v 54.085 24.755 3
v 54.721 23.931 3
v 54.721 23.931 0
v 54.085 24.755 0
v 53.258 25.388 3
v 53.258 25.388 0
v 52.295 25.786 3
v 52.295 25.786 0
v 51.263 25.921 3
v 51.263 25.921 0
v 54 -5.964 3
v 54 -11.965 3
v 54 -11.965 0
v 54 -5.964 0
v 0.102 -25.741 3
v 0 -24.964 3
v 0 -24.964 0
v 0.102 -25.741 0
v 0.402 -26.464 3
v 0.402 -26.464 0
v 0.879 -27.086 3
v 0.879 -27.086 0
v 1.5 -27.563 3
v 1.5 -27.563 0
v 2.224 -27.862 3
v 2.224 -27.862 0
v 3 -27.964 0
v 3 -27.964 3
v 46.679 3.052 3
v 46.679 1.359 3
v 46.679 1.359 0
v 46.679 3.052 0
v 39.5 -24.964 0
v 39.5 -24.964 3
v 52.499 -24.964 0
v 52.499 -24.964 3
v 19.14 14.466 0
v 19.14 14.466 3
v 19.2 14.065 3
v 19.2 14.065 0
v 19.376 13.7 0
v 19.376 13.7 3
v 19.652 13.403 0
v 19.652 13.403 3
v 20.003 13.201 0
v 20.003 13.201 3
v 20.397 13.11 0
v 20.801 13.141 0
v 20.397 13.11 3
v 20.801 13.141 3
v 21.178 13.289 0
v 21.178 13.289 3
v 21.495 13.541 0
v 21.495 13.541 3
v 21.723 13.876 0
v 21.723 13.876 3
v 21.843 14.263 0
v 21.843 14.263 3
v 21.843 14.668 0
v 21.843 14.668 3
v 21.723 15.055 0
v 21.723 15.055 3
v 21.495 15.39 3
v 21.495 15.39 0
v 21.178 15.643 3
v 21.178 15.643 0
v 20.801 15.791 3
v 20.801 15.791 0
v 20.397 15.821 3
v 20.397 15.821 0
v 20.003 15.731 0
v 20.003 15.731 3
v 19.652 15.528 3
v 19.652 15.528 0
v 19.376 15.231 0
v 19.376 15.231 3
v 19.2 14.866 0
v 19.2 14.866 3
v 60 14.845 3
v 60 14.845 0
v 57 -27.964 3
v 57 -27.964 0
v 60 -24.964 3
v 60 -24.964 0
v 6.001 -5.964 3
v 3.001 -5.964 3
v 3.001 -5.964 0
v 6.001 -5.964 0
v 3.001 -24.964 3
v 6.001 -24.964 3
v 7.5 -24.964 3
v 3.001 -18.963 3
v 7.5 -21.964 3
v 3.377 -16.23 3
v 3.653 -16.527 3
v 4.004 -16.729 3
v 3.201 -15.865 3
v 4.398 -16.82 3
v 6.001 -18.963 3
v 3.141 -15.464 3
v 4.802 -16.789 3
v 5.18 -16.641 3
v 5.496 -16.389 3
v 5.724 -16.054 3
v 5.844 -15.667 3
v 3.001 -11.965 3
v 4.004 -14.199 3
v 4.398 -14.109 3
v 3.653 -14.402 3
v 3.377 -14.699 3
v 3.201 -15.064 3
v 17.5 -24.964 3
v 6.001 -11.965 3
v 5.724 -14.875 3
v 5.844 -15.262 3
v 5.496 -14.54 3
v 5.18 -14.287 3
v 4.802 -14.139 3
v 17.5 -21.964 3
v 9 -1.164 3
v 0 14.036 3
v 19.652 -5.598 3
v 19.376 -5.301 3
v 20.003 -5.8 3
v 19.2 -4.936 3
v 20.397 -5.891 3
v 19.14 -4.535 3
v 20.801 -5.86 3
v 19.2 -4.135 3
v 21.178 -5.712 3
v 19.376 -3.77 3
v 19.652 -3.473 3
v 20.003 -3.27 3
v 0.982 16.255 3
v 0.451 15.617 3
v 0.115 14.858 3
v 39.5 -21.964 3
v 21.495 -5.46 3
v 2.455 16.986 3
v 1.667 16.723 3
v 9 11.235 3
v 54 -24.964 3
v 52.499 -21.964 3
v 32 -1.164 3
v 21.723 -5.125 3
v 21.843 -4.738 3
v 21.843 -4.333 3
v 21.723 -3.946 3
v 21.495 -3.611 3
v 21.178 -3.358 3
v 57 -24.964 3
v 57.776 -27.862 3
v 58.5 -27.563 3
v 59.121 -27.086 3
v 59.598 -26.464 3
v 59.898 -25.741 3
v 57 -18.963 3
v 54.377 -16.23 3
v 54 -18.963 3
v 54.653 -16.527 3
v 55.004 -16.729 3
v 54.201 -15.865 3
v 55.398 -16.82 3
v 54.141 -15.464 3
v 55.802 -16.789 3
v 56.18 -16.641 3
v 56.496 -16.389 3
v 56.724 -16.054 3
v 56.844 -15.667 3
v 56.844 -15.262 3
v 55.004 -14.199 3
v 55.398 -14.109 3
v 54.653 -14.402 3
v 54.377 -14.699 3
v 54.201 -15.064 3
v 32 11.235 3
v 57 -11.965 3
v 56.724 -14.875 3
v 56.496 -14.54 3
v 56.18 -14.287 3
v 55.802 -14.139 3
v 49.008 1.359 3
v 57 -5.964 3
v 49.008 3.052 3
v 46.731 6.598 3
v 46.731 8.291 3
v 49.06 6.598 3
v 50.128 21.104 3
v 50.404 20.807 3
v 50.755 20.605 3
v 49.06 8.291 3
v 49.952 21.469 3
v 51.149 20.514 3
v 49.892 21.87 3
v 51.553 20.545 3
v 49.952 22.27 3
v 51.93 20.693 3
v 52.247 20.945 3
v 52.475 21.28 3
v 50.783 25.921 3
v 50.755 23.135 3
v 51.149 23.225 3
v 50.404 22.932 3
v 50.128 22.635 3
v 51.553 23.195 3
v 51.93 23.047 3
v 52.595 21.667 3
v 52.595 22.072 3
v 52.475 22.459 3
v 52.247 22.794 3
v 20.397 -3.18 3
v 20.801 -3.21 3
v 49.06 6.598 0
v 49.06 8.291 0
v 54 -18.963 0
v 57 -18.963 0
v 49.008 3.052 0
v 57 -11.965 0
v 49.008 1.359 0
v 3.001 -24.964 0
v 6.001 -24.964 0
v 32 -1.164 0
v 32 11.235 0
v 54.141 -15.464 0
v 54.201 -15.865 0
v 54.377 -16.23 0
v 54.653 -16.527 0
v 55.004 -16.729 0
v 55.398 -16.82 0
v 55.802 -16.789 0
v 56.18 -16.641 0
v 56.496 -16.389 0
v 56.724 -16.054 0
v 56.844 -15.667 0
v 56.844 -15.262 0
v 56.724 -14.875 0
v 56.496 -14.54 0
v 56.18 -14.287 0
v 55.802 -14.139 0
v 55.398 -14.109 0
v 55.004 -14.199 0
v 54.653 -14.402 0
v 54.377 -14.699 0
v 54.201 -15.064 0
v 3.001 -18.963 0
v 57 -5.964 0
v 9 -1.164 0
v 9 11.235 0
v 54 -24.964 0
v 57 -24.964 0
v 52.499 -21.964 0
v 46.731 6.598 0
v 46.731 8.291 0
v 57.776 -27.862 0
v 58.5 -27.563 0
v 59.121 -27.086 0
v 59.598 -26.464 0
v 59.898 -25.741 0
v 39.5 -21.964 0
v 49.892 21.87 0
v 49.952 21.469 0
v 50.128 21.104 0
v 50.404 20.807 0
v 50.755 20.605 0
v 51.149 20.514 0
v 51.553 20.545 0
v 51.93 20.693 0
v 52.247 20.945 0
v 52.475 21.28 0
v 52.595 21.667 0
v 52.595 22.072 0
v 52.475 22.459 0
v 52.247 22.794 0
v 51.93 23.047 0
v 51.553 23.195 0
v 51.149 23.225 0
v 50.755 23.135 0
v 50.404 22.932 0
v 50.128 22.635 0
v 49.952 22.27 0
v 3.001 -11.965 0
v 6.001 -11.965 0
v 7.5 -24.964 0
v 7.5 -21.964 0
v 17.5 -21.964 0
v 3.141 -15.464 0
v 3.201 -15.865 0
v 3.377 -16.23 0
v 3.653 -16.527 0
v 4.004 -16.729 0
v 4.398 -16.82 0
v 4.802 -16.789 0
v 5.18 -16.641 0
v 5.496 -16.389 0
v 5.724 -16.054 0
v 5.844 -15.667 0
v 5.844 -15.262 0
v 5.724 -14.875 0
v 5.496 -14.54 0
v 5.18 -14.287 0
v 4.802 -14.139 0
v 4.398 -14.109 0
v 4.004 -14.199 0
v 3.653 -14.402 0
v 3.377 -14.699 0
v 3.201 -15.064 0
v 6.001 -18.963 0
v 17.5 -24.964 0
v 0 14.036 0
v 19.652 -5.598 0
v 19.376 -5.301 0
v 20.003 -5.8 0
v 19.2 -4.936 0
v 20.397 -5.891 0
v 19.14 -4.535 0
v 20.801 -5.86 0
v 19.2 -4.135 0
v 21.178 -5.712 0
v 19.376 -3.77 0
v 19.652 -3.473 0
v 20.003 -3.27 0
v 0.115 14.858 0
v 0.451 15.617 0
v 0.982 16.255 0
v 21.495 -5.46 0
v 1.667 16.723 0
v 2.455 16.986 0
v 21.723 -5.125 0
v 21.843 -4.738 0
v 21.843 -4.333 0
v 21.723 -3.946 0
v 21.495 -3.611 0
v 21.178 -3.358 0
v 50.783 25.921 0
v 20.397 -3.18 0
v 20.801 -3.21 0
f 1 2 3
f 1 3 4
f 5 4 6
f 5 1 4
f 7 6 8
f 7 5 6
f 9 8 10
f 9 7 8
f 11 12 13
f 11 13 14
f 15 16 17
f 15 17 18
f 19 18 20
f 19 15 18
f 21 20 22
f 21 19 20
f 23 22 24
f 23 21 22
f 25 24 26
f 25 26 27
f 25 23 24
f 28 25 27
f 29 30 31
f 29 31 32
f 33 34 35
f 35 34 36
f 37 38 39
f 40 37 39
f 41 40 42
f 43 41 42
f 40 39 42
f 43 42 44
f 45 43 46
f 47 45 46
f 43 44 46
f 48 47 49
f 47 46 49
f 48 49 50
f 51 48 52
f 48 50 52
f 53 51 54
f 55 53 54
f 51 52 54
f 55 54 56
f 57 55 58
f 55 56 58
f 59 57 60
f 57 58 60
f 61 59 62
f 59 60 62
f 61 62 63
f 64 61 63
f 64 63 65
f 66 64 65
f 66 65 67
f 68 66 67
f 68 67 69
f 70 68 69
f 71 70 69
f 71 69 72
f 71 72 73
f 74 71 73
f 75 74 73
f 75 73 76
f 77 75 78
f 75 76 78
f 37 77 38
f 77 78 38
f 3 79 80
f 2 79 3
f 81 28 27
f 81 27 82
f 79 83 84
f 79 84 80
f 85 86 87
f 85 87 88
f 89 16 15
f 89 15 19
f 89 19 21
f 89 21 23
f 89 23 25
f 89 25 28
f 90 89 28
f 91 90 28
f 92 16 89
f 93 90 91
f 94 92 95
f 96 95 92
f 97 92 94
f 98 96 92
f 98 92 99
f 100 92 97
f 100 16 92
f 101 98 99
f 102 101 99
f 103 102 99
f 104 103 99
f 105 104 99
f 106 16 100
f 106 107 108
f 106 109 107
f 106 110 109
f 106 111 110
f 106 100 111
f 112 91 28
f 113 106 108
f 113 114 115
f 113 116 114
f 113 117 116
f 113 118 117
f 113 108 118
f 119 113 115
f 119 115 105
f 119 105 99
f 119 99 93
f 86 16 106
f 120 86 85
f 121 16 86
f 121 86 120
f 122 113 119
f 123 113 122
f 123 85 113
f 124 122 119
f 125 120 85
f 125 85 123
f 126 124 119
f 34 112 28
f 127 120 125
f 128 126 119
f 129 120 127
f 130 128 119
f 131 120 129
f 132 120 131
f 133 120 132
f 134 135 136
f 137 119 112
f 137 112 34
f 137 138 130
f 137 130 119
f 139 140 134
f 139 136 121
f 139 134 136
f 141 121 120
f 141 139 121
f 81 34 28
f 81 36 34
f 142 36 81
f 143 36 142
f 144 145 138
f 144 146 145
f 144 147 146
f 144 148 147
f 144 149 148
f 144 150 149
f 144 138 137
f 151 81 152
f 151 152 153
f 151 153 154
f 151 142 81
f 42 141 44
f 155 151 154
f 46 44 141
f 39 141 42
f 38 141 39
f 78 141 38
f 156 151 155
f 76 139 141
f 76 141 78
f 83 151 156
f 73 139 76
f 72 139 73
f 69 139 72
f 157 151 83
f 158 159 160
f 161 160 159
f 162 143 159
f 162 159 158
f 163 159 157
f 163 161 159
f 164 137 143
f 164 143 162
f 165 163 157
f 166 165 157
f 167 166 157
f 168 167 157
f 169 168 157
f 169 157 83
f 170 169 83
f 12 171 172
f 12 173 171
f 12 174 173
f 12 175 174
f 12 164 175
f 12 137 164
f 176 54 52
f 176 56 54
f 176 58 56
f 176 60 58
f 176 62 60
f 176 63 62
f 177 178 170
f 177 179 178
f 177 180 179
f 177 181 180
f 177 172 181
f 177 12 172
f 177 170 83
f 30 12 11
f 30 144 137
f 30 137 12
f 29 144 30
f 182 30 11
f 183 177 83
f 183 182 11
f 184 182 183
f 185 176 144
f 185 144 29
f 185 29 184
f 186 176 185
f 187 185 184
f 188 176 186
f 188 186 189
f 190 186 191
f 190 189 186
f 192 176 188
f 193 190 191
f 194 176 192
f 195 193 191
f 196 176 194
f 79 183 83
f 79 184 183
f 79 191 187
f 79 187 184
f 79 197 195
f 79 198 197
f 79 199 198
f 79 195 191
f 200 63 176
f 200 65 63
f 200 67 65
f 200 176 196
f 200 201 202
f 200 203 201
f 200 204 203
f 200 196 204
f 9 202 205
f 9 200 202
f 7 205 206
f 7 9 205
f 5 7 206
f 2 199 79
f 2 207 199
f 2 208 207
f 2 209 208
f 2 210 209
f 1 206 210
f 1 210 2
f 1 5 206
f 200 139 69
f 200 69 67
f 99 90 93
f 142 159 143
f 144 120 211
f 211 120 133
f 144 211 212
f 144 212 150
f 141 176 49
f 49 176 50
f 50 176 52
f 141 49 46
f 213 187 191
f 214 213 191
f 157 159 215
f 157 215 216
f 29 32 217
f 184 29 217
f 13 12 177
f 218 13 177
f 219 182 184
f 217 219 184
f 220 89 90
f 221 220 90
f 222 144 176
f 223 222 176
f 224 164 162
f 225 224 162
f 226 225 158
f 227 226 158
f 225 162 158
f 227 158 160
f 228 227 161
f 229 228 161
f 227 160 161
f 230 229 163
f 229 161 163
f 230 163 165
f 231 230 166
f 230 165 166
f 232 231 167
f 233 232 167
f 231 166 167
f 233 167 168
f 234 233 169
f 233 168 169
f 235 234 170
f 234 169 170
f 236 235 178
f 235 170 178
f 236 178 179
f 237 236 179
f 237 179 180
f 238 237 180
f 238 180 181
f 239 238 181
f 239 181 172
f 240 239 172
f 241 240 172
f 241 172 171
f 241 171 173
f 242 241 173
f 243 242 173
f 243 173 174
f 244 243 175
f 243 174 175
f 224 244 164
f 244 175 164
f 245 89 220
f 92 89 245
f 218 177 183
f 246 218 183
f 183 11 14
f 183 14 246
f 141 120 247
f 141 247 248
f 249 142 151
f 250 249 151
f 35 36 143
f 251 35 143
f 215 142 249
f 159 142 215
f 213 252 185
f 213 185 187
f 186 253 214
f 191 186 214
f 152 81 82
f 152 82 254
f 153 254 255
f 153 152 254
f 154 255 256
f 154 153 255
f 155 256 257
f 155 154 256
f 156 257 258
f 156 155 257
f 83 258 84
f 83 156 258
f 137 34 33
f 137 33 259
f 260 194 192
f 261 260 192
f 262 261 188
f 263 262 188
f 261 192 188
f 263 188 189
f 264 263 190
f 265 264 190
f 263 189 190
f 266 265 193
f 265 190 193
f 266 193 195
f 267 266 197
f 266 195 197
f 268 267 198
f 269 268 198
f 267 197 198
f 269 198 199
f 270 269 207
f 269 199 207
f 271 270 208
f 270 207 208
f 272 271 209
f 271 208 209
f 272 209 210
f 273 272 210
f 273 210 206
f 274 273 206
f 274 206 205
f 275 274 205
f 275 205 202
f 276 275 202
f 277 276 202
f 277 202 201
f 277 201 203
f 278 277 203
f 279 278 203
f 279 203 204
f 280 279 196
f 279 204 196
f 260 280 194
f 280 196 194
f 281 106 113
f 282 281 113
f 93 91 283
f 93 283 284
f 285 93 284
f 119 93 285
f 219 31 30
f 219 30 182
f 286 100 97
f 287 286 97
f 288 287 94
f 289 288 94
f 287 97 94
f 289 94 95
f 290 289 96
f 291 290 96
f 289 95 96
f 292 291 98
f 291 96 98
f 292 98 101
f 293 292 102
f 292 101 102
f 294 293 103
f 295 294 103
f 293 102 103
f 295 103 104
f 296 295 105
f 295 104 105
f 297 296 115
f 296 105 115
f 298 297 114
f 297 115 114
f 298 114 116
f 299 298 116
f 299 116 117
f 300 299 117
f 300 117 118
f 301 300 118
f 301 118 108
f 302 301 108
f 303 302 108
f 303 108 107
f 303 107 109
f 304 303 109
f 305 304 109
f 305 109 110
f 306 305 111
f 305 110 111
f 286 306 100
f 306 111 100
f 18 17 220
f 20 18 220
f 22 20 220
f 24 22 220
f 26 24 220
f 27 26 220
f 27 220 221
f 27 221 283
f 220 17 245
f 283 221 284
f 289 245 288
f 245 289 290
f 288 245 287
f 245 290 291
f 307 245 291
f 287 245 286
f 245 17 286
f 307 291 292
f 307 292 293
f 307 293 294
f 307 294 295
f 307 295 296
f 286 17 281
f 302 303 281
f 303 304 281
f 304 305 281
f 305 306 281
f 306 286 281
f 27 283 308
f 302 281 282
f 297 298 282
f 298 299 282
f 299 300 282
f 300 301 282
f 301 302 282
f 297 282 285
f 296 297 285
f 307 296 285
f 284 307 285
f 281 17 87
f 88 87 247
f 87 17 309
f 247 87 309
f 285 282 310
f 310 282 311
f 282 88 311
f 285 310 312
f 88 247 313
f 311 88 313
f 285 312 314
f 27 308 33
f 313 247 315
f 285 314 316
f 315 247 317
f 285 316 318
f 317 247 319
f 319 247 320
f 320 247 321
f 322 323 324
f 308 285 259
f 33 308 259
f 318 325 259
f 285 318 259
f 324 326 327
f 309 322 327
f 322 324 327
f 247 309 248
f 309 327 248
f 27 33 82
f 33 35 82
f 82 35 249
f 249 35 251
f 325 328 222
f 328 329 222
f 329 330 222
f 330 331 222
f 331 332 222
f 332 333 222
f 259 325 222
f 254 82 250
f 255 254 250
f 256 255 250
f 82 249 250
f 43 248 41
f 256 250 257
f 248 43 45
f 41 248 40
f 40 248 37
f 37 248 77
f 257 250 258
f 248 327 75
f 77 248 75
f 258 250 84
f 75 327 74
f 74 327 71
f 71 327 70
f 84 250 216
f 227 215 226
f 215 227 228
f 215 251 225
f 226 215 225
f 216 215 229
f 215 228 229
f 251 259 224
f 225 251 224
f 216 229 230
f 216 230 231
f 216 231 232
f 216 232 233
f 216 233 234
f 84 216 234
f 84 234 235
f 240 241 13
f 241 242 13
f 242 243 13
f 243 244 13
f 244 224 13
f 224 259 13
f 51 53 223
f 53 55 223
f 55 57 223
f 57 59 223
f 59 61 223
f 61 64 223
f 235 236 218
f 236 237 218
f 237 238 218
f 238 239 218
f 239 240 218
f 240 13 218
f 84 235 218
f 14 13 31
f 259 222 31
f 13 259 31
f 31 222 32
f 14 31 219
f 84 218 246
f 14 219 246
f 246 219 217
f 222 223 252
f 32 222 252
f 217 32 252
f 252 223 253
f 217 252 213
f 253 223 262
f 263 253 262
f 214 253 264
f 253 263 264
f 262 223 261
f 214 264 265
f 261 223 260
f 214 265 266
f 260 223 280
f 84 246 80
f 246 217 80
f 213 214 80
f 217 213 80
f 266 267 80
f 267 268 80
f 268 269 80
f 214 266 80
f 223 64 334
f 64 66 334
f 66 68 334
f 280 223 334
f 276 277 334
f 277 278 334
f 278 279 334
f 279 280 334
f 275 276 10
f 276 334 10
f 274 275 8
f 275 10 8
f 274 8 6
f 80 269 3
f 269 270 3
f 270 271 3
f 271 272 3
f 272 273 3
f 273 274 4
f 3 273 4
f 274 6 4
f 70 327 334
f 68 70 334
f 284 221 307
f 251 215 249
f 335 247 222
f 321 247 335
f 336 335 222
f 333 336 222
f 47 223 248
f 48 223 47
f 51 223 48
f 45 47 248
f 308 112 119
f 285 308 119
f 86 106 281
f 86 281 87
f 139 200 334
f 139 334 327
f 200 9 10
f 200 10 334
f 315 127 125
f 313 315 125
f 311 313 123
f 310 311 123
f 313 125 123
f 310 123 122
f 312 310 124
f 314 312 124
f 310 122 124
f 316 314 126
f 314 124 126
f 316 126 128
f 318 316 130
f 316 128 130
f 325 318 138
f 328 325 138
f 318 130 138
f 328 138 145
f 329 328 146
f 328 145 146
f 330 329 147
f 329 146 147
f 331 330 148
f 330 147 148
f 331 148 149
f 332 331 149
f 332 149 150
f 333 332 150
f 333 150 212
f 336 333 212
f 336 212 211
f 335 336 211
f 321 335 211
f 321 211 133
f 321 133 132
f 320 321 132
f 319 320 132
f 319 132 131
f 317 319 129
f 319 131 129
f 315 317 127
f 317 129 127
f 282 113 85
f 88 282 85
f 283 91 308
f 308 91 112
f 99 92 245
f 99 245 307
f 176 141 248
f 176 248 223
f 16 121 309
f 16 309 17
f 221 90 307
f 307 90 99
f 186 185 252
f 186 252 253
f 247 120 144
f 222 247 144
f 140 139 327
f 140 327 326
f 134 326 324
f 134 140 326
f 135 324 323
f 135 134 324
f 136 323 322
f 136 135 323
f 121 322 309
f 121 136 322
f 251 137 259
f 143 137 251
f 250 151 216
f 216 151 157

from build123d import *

# Parameters (mm, degrees)
SKETCH_1_R      = 1.359
SKETCH_1_W      = 2.329
SKETCH_1_H      = 1.693
SKETCH_1_W_2    = 12.999
SKETCH_1_H_2    = 3
SKETCH_1_W_3    = 10
SKETCH_1_W_4    = 3
SKETCH_1_H_3    = 6.001
SKETCH_1_W_5    = 23
SKETCH_1_H_4    = 12.399
EXTRUDE_1_DEPTH = 3


with BuildPart() as part:
    # 草图1 → 凸台-拉伸1 (new body)
    with BuildSketch(Plane.XY.offset(3)):
        with BuildLine():
            Line((3, -27.964431369), (57, -27.964431369))
            ThreePointArc((57, -27.964431369), (59.121320344, -27.085751712), (60, -24.964431369))
            Line((60, -24.964431369), (60, 14.844527968))
            Line((60, 14.844527968), (54.721484389, 23.930621486))
            ThreePointArc((54.721484389, 23.930621486), (53.258114674, 25.388095235), (51.262778196, 25.921305316))
            Line((51.262778196, 25.921305316), (50.782638999, 25.921305316))
            Line((50.782638999, 25.921305316), (2.454554127, 16.985586191))
            ThreePointArc((2.454554127, 16.985586191), (0.693884476, 15.954397926), (0, 14.035588089))
            Line((0, 14.035588089), (0, -24.964431369))
            ThreePointArc((0, -24.964431369), (0.878679656, -27.085751712), (3, -27.964431369))
        make_face()
        with Locations(Location((51.251, 21.869668631, 0), (0, 0, 180))):
            Circle(SKETCH_1_R, mode=Mode.SUBTRACT)
        with Locations(Location((20.499, 14.465668631, 0), (0, 0, 180))):
            Circle(SKETCH_1_R, mode=Mode.SUBTRACT)
        with Locations(Location((20.499, -4.535331369, 0), (0, 0, 180))):
            Circle(SKETCH_1_R, mode=Mode.SUBTRACT)
        with Locations(Location((4.5, -15.464331369, 0), (0, 0, 180))):
            Circle(SKETCH_1_R, mode=Mode.SUBTRACT)
        with Locations(Location((55.5, -15.464331369, 0), (0, 0, 180))):
            Circle(SKETCH_1_R, mode=Mode.SUBTRACT)
        with Locations((47.8435, 2.205168631)):
            Rectangle(SKETCH_1_W, SKETCH_1_H, mode=Mode.SUBTRACT)
        with Locations((47.8955, 7.444168631)):
            Rectangle(SKETCH_1_W, SKETCH_1_H, mode=Mode.SUBTRACT)
        with Locations((45.9995, -23.464331369)):
            Rectangle(SKETCH_1_W_2, SKETCH_1_H_2, mode=Mode.SUBTRACT)
        with Locations((12.5, -23.464331369)):
            Rectangle(SKETCH_1_W_3, SKETCH_1_H_2, mode=Mode.SUBTRACT)
        with Locations((55.5, -8.964831369)):
            Rectangle(SKETCH_1_W_4, SKETCH_1_H_3, mode=Mode.SUBTRACT)
        with Locations((55.5, -21.963831369)):
            Rectangle(SKETCH_1_W_4, SKETCH_1_H_3, mode=Mode.SUBTRACT)
        with Locations((4.501, -21.963831369)):
            Rectangle(SKETCH_1_W_4, SKETCH_1_H_3, mode=Mode.SUBTRACT)
        with Locations((4.501, -8.964831369)):
            Rectangle(SKETCH_1_W_4, SKETCH_1_H_3, mode=Mode.SUBTRACT)
        with Locations((20.5, 5.035168631)):
            Rectangle(SKETCH_1_W_5, SKETCH_1_H_4, mode=Mode.SUBTRACT)
    extrude(amount=-EXTRUDE_1_DEPTH)


solid = part.part
